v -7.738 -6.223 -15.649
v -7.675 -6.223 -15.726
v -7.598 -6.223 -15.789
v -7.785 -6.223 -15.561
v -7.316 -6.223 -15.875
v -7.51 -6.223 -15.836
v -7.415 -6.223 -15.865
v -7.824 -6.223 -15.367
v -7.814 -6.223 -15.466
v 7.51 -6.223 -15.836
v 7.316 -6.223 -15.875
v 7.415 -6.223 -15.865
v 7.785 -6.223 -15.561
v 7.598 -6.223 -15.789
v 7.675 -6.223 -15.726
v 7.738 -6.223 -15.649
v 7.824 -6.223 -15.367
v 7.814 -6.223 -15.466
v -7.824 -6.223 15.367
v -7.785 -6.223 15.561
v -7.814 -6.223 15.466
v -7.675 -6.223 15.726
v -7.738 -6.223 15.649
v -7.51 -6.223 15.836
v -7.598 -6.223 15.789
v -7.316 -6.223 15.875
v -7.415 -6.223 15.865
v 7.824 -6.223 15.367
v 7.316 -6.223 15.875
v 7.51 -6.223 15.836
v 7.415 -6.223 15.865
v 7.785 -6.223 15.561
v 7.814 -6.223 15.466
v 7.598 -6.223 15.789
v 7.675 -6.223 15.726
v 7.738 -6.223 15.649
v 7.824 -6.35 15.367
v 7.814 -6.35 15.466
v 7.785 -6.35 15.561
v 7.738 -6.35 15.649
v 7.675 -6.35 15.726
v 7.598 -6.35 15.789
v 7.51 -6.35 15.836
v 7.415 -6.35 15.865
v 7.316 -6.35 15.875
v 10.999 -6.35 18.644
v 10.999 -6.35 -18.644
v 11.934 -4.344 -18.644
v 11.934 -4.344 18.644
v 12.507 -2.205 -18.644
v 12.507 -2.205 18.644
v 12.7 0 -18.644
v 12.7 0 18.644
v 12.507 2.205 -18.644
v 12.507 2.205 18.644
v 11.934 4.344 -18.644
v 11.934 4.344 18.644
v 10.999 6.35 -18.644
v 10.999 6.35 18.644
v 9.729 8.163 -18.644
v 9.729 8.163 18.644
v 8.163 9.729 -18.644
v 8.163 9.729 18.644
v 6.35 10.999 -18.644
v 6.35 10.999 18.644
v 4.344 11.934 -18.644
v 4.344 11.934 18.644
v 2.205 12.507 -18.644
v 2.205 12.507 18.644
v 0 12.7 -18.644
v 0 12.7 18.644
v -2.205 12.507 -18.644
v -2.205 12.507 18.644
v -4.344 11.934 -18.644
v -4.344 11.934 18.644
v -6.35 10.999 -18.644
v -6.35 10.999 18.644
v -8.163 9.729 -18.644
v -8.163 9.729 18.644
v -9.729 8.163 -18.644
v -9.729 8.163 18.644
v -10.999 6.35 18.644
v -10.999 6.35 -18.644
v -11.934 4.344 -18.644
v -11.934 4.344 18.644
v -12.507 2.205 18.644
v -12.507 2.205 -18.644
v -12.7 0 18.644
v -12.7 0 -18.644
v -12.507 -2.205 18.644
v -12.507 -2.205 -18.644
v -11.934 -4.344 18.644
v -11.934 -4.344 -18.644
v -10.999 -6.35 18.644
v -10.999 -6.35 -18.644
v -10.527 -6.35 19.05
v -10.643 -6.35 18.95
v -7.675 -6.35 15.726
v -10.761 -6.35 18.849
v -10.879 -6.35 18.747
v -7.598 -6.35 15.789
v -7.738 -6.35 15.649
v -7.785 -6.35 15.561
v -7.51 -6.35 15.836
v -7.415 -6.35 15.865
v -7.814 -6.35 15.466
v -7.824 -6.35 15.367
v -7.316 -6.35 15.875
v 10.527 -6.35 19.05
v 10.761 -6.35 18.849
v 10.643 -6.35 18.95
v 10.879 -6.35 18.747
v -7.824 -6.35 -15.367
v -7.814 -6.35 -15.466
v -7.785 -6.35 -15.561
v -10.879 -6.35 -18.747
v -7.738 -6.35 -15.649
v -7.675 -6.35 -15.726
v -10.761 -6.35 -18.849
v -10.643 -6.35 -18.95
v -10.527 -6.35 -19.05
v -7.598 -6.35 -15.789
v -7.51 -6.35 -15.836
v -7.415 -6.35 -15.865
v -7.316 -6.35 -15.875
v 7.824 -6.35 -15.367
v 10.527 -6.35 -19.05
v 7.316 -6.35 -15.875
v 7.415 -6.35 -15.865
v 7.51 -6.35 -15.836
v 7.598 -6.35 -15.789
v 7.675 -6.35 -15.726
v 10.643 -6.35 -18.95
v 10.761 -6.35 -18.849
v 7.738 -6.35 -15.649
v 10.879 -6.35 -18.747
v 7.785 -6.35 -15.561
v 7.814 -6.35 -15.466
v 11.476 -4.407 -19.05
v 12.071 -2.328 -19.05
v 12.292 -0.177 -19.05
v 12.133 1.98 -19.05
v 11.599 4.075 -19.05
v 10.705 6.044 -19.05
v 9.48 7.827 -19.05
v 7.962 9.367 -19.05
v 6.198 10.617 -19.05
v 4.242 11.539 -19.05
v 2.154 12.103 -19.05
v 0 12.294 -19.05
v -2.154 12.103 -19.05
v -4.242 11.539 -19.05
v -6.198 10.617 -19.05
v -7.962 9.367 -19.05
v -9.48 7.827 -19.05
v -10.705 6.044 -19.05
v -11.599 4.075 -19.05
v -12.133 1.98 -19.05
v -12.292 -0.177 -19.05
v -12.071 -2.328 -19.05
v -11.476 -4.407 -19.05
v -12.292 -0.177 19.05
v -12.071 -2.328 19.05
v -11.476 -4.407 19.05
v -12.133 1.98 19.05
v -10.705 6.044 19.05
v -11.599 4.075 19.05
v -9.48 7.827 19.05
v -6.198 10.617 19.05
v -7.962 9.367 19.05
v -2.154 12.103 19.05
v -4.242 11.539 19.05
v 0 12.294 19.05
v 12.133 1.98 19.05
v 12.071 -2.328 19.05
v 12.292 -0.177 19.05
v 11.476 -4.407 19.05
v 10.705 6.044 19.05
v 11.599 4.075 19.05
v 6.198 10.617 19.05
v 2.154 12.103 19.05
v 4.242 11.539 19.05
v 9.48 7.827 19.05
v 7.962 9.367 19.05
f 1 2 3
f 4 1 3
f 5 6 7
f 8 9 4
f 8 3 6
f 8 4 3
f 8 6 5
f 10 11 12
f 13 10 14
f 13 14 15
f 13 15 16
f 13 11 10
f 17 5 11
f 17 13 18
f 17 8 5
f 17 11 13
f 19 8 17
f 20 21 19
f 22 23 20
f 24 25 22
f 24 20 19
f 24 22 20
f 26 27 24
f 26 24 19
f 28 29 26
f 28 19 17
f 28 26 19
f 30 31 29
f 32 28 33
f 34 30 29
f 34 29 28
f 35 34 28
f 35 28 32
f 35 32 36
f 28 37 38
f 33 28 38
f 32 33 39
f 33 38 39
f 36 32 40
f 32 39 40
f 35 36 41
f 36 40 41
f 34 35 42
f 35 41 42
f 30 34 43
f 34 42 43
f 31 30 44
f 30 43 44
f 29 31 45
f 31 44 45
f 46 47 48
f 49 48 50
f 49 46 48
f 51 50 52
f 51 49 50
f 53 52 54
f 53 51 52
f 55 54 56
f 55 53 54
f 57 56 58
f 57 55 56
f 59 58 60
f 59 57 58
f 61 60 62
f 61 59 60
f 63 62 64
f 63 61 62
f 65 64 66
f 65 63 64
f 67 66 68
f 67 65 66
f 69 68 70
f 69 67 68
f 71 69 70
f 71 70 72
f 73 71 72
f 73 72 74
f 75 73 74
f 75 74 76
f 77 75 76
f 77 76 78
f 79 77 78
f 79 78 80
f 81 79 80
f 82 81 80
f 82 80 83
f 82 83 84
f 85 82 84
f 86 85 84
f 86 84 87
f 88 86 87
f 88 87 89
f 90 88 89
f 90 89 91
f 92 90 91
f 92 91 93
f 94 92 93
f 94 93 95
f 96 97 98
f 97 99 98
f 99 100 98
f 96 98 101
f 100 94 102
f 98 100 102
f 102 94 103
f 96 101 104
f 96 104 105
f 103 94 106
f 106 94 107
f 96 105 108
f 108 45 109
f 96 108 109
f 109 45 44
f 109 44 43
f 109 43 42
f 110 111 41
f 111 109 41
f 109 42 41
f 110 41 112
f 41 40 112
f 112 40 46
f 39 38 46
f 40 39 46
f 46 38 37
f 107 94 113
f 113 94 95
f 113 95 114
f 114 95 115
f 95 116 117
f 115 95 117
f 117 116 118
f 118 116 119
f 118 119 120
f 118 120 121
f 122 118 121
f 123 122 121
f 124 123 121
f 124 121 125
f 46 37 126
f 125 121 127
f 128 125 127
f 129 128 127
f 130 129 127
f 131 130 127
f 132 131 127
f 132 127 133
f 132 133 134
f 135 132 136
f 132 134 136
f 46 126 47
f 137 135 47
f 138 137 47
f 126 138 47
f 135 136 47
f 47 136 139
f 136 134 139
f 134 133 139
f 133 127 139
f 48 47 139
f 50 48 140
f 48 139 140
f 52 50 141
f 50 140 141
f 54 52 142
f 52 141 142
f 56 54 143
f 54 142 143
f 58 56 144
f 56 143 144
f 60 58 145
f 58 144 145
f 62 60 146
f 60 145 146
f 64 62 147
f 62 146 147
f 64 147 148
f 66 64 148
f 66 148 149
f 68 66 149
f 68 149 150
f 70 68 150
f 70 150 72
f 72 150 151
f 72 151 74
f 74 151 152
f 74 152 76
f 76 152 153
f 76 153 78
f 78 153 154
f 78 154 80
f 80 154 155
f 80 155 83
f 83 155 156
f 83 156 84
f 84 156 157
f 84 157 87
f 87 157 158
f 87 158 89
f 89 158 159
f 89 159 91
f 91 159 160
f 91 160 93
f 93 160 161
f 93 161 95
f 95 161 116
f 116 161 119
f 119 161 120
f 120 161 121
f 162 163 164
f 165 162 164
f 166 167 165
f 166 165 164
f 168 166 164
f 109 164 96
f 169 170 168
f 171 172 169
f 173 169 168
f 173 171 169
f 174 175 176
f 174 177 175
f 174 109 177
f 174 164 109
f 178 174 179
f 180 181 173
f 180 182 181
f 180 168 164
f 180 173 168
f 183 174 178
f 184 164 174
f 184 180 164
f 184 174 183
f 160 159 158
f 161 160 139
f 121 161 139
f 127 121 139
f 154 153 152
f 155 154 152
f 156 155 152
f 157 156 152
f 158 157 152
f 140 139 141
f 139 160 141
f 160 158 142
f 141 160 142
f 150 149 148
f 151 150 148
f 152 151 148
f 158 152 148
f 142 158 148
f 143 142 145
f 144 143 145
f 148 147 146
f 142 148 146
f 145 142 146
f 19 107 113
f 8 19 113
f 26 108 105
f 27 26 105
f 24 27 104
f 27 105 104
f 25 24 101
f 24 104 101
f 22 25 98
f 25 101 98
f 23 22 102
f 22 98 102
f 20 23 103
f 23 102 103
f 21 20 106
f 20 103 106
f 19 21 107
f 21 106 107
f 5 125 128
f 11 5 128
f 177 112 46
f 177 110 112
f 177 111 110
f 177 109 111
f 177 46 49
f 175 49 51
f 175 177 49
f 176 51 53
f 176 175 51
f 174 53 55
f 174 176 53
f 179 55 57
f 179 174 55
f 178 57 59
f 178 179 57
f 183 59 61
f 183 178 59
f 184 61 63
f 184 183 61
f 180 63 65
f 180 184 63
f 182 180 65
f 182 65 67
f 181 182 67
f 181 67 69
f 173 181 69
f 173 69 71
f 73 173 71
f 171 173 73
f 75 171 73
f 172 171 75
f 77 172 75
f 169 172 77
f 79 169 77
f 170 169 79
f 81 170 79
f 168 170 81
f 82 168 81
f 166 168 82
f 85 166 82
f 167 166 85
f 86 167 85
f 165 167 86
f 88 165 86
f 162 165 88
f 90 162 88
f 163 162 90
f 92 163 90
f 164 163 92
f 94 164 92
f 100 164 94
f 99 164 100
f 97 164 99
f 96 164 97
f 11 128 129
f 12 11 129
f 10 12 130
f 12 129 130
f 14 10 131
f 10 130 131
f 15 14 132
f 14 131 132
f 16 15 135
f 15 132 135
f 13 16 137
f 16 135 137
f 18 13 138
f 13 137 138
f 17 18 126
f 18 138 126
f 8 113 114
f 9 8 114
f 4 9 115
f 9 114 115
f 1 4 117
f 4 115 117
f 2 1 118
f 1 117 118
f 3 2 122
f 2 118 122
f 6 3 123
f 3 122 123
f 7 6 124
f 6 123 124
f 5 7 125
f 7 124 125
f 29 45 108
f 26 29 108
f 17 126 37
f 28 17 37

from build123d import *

# Parameters (mm, degrees)
SKETCH1_R            = 12.7
EXTRUDE1_DEPTH       = 19.05
CHAMFER1_SIZE        = 0.4064
TRUNCATED_DEPTH      = 20.05
TRUNCATED_DEPTH_BACK = 20.05
RECESSED_DEPTH       = 0.127


with BuildPart() as part:
    # Sketch1 → Extrude1 (new body, symmetric)
    with BuildSketch(Plane.XY):
        Circle(SKETCH1_R)
    extrude(amount=EXTRUDE1_DEPTH, both=True)

    # Chamfer1
    chamfer1_edges = [part.edges().sort_by_distance(p)[0] for p in [
        (-12.7, 0, -19.05),
        (-12.7, 0, 19.05),
    ]]
    chamfer(chamfer1_edges, length=CHAMFER1_SIZE)

    # Sketch2 → Truncated (cut, two sides)
    with BuildSketch(Plane.XY) as truncated_sk:
        with BuildLine():
            Line((-10.998522628, -6.35), (10.998522628, -6.35))
            ThreePointArc((10.998522628, -6.35), (0, -12.7), (-10.998522628, -6.35))
        make_face()
    extrude(amount=TRUNCATED_DEPTH, mode=Mode.SUBTRACT)
    extrude(truncated_sk.sketch, amount=-TRUNCATED_DEPTH_BACK, mode=Mode.SUBTRACT)

    # Sketch3 → Recessed (cut)
    with BuildSketch(Plane.XZ.offset(6.35)):
        with BuildLine():
            Line((7.315522628, 15.875), (-7.315522628, 15.875))
            ThreePointArc((-7.315522628, 15.875), (-7.674732873, 15.726210245), (-7.823522628, 15.367))
            Line((-7.823522628, 15.367), (-7.823522628, -15.367))
            ThreePointArc((-7.823522628, -15.367), (-7.674732873, -15.726210245), (-7.315522628, -15.875))
            Line((-7.315522628, -15.875), (7.315522628, -15.875))
            ThreePointArc((7.315522628, -15.875), (7.674732873, -15.726210245), (7.823522628, -15.367))
            Line((7.823522628, -15.367), (7.823522628, 15.367))
            ThreePointArc((7.823522628, 15.367), (7.674732873, 15.726210245), (7.315522628, 15.875))
        make_face()
    extrude(amount=-RECESSED_DEPTH, mode=Mode.SUBTRACT)


solid = part.part
